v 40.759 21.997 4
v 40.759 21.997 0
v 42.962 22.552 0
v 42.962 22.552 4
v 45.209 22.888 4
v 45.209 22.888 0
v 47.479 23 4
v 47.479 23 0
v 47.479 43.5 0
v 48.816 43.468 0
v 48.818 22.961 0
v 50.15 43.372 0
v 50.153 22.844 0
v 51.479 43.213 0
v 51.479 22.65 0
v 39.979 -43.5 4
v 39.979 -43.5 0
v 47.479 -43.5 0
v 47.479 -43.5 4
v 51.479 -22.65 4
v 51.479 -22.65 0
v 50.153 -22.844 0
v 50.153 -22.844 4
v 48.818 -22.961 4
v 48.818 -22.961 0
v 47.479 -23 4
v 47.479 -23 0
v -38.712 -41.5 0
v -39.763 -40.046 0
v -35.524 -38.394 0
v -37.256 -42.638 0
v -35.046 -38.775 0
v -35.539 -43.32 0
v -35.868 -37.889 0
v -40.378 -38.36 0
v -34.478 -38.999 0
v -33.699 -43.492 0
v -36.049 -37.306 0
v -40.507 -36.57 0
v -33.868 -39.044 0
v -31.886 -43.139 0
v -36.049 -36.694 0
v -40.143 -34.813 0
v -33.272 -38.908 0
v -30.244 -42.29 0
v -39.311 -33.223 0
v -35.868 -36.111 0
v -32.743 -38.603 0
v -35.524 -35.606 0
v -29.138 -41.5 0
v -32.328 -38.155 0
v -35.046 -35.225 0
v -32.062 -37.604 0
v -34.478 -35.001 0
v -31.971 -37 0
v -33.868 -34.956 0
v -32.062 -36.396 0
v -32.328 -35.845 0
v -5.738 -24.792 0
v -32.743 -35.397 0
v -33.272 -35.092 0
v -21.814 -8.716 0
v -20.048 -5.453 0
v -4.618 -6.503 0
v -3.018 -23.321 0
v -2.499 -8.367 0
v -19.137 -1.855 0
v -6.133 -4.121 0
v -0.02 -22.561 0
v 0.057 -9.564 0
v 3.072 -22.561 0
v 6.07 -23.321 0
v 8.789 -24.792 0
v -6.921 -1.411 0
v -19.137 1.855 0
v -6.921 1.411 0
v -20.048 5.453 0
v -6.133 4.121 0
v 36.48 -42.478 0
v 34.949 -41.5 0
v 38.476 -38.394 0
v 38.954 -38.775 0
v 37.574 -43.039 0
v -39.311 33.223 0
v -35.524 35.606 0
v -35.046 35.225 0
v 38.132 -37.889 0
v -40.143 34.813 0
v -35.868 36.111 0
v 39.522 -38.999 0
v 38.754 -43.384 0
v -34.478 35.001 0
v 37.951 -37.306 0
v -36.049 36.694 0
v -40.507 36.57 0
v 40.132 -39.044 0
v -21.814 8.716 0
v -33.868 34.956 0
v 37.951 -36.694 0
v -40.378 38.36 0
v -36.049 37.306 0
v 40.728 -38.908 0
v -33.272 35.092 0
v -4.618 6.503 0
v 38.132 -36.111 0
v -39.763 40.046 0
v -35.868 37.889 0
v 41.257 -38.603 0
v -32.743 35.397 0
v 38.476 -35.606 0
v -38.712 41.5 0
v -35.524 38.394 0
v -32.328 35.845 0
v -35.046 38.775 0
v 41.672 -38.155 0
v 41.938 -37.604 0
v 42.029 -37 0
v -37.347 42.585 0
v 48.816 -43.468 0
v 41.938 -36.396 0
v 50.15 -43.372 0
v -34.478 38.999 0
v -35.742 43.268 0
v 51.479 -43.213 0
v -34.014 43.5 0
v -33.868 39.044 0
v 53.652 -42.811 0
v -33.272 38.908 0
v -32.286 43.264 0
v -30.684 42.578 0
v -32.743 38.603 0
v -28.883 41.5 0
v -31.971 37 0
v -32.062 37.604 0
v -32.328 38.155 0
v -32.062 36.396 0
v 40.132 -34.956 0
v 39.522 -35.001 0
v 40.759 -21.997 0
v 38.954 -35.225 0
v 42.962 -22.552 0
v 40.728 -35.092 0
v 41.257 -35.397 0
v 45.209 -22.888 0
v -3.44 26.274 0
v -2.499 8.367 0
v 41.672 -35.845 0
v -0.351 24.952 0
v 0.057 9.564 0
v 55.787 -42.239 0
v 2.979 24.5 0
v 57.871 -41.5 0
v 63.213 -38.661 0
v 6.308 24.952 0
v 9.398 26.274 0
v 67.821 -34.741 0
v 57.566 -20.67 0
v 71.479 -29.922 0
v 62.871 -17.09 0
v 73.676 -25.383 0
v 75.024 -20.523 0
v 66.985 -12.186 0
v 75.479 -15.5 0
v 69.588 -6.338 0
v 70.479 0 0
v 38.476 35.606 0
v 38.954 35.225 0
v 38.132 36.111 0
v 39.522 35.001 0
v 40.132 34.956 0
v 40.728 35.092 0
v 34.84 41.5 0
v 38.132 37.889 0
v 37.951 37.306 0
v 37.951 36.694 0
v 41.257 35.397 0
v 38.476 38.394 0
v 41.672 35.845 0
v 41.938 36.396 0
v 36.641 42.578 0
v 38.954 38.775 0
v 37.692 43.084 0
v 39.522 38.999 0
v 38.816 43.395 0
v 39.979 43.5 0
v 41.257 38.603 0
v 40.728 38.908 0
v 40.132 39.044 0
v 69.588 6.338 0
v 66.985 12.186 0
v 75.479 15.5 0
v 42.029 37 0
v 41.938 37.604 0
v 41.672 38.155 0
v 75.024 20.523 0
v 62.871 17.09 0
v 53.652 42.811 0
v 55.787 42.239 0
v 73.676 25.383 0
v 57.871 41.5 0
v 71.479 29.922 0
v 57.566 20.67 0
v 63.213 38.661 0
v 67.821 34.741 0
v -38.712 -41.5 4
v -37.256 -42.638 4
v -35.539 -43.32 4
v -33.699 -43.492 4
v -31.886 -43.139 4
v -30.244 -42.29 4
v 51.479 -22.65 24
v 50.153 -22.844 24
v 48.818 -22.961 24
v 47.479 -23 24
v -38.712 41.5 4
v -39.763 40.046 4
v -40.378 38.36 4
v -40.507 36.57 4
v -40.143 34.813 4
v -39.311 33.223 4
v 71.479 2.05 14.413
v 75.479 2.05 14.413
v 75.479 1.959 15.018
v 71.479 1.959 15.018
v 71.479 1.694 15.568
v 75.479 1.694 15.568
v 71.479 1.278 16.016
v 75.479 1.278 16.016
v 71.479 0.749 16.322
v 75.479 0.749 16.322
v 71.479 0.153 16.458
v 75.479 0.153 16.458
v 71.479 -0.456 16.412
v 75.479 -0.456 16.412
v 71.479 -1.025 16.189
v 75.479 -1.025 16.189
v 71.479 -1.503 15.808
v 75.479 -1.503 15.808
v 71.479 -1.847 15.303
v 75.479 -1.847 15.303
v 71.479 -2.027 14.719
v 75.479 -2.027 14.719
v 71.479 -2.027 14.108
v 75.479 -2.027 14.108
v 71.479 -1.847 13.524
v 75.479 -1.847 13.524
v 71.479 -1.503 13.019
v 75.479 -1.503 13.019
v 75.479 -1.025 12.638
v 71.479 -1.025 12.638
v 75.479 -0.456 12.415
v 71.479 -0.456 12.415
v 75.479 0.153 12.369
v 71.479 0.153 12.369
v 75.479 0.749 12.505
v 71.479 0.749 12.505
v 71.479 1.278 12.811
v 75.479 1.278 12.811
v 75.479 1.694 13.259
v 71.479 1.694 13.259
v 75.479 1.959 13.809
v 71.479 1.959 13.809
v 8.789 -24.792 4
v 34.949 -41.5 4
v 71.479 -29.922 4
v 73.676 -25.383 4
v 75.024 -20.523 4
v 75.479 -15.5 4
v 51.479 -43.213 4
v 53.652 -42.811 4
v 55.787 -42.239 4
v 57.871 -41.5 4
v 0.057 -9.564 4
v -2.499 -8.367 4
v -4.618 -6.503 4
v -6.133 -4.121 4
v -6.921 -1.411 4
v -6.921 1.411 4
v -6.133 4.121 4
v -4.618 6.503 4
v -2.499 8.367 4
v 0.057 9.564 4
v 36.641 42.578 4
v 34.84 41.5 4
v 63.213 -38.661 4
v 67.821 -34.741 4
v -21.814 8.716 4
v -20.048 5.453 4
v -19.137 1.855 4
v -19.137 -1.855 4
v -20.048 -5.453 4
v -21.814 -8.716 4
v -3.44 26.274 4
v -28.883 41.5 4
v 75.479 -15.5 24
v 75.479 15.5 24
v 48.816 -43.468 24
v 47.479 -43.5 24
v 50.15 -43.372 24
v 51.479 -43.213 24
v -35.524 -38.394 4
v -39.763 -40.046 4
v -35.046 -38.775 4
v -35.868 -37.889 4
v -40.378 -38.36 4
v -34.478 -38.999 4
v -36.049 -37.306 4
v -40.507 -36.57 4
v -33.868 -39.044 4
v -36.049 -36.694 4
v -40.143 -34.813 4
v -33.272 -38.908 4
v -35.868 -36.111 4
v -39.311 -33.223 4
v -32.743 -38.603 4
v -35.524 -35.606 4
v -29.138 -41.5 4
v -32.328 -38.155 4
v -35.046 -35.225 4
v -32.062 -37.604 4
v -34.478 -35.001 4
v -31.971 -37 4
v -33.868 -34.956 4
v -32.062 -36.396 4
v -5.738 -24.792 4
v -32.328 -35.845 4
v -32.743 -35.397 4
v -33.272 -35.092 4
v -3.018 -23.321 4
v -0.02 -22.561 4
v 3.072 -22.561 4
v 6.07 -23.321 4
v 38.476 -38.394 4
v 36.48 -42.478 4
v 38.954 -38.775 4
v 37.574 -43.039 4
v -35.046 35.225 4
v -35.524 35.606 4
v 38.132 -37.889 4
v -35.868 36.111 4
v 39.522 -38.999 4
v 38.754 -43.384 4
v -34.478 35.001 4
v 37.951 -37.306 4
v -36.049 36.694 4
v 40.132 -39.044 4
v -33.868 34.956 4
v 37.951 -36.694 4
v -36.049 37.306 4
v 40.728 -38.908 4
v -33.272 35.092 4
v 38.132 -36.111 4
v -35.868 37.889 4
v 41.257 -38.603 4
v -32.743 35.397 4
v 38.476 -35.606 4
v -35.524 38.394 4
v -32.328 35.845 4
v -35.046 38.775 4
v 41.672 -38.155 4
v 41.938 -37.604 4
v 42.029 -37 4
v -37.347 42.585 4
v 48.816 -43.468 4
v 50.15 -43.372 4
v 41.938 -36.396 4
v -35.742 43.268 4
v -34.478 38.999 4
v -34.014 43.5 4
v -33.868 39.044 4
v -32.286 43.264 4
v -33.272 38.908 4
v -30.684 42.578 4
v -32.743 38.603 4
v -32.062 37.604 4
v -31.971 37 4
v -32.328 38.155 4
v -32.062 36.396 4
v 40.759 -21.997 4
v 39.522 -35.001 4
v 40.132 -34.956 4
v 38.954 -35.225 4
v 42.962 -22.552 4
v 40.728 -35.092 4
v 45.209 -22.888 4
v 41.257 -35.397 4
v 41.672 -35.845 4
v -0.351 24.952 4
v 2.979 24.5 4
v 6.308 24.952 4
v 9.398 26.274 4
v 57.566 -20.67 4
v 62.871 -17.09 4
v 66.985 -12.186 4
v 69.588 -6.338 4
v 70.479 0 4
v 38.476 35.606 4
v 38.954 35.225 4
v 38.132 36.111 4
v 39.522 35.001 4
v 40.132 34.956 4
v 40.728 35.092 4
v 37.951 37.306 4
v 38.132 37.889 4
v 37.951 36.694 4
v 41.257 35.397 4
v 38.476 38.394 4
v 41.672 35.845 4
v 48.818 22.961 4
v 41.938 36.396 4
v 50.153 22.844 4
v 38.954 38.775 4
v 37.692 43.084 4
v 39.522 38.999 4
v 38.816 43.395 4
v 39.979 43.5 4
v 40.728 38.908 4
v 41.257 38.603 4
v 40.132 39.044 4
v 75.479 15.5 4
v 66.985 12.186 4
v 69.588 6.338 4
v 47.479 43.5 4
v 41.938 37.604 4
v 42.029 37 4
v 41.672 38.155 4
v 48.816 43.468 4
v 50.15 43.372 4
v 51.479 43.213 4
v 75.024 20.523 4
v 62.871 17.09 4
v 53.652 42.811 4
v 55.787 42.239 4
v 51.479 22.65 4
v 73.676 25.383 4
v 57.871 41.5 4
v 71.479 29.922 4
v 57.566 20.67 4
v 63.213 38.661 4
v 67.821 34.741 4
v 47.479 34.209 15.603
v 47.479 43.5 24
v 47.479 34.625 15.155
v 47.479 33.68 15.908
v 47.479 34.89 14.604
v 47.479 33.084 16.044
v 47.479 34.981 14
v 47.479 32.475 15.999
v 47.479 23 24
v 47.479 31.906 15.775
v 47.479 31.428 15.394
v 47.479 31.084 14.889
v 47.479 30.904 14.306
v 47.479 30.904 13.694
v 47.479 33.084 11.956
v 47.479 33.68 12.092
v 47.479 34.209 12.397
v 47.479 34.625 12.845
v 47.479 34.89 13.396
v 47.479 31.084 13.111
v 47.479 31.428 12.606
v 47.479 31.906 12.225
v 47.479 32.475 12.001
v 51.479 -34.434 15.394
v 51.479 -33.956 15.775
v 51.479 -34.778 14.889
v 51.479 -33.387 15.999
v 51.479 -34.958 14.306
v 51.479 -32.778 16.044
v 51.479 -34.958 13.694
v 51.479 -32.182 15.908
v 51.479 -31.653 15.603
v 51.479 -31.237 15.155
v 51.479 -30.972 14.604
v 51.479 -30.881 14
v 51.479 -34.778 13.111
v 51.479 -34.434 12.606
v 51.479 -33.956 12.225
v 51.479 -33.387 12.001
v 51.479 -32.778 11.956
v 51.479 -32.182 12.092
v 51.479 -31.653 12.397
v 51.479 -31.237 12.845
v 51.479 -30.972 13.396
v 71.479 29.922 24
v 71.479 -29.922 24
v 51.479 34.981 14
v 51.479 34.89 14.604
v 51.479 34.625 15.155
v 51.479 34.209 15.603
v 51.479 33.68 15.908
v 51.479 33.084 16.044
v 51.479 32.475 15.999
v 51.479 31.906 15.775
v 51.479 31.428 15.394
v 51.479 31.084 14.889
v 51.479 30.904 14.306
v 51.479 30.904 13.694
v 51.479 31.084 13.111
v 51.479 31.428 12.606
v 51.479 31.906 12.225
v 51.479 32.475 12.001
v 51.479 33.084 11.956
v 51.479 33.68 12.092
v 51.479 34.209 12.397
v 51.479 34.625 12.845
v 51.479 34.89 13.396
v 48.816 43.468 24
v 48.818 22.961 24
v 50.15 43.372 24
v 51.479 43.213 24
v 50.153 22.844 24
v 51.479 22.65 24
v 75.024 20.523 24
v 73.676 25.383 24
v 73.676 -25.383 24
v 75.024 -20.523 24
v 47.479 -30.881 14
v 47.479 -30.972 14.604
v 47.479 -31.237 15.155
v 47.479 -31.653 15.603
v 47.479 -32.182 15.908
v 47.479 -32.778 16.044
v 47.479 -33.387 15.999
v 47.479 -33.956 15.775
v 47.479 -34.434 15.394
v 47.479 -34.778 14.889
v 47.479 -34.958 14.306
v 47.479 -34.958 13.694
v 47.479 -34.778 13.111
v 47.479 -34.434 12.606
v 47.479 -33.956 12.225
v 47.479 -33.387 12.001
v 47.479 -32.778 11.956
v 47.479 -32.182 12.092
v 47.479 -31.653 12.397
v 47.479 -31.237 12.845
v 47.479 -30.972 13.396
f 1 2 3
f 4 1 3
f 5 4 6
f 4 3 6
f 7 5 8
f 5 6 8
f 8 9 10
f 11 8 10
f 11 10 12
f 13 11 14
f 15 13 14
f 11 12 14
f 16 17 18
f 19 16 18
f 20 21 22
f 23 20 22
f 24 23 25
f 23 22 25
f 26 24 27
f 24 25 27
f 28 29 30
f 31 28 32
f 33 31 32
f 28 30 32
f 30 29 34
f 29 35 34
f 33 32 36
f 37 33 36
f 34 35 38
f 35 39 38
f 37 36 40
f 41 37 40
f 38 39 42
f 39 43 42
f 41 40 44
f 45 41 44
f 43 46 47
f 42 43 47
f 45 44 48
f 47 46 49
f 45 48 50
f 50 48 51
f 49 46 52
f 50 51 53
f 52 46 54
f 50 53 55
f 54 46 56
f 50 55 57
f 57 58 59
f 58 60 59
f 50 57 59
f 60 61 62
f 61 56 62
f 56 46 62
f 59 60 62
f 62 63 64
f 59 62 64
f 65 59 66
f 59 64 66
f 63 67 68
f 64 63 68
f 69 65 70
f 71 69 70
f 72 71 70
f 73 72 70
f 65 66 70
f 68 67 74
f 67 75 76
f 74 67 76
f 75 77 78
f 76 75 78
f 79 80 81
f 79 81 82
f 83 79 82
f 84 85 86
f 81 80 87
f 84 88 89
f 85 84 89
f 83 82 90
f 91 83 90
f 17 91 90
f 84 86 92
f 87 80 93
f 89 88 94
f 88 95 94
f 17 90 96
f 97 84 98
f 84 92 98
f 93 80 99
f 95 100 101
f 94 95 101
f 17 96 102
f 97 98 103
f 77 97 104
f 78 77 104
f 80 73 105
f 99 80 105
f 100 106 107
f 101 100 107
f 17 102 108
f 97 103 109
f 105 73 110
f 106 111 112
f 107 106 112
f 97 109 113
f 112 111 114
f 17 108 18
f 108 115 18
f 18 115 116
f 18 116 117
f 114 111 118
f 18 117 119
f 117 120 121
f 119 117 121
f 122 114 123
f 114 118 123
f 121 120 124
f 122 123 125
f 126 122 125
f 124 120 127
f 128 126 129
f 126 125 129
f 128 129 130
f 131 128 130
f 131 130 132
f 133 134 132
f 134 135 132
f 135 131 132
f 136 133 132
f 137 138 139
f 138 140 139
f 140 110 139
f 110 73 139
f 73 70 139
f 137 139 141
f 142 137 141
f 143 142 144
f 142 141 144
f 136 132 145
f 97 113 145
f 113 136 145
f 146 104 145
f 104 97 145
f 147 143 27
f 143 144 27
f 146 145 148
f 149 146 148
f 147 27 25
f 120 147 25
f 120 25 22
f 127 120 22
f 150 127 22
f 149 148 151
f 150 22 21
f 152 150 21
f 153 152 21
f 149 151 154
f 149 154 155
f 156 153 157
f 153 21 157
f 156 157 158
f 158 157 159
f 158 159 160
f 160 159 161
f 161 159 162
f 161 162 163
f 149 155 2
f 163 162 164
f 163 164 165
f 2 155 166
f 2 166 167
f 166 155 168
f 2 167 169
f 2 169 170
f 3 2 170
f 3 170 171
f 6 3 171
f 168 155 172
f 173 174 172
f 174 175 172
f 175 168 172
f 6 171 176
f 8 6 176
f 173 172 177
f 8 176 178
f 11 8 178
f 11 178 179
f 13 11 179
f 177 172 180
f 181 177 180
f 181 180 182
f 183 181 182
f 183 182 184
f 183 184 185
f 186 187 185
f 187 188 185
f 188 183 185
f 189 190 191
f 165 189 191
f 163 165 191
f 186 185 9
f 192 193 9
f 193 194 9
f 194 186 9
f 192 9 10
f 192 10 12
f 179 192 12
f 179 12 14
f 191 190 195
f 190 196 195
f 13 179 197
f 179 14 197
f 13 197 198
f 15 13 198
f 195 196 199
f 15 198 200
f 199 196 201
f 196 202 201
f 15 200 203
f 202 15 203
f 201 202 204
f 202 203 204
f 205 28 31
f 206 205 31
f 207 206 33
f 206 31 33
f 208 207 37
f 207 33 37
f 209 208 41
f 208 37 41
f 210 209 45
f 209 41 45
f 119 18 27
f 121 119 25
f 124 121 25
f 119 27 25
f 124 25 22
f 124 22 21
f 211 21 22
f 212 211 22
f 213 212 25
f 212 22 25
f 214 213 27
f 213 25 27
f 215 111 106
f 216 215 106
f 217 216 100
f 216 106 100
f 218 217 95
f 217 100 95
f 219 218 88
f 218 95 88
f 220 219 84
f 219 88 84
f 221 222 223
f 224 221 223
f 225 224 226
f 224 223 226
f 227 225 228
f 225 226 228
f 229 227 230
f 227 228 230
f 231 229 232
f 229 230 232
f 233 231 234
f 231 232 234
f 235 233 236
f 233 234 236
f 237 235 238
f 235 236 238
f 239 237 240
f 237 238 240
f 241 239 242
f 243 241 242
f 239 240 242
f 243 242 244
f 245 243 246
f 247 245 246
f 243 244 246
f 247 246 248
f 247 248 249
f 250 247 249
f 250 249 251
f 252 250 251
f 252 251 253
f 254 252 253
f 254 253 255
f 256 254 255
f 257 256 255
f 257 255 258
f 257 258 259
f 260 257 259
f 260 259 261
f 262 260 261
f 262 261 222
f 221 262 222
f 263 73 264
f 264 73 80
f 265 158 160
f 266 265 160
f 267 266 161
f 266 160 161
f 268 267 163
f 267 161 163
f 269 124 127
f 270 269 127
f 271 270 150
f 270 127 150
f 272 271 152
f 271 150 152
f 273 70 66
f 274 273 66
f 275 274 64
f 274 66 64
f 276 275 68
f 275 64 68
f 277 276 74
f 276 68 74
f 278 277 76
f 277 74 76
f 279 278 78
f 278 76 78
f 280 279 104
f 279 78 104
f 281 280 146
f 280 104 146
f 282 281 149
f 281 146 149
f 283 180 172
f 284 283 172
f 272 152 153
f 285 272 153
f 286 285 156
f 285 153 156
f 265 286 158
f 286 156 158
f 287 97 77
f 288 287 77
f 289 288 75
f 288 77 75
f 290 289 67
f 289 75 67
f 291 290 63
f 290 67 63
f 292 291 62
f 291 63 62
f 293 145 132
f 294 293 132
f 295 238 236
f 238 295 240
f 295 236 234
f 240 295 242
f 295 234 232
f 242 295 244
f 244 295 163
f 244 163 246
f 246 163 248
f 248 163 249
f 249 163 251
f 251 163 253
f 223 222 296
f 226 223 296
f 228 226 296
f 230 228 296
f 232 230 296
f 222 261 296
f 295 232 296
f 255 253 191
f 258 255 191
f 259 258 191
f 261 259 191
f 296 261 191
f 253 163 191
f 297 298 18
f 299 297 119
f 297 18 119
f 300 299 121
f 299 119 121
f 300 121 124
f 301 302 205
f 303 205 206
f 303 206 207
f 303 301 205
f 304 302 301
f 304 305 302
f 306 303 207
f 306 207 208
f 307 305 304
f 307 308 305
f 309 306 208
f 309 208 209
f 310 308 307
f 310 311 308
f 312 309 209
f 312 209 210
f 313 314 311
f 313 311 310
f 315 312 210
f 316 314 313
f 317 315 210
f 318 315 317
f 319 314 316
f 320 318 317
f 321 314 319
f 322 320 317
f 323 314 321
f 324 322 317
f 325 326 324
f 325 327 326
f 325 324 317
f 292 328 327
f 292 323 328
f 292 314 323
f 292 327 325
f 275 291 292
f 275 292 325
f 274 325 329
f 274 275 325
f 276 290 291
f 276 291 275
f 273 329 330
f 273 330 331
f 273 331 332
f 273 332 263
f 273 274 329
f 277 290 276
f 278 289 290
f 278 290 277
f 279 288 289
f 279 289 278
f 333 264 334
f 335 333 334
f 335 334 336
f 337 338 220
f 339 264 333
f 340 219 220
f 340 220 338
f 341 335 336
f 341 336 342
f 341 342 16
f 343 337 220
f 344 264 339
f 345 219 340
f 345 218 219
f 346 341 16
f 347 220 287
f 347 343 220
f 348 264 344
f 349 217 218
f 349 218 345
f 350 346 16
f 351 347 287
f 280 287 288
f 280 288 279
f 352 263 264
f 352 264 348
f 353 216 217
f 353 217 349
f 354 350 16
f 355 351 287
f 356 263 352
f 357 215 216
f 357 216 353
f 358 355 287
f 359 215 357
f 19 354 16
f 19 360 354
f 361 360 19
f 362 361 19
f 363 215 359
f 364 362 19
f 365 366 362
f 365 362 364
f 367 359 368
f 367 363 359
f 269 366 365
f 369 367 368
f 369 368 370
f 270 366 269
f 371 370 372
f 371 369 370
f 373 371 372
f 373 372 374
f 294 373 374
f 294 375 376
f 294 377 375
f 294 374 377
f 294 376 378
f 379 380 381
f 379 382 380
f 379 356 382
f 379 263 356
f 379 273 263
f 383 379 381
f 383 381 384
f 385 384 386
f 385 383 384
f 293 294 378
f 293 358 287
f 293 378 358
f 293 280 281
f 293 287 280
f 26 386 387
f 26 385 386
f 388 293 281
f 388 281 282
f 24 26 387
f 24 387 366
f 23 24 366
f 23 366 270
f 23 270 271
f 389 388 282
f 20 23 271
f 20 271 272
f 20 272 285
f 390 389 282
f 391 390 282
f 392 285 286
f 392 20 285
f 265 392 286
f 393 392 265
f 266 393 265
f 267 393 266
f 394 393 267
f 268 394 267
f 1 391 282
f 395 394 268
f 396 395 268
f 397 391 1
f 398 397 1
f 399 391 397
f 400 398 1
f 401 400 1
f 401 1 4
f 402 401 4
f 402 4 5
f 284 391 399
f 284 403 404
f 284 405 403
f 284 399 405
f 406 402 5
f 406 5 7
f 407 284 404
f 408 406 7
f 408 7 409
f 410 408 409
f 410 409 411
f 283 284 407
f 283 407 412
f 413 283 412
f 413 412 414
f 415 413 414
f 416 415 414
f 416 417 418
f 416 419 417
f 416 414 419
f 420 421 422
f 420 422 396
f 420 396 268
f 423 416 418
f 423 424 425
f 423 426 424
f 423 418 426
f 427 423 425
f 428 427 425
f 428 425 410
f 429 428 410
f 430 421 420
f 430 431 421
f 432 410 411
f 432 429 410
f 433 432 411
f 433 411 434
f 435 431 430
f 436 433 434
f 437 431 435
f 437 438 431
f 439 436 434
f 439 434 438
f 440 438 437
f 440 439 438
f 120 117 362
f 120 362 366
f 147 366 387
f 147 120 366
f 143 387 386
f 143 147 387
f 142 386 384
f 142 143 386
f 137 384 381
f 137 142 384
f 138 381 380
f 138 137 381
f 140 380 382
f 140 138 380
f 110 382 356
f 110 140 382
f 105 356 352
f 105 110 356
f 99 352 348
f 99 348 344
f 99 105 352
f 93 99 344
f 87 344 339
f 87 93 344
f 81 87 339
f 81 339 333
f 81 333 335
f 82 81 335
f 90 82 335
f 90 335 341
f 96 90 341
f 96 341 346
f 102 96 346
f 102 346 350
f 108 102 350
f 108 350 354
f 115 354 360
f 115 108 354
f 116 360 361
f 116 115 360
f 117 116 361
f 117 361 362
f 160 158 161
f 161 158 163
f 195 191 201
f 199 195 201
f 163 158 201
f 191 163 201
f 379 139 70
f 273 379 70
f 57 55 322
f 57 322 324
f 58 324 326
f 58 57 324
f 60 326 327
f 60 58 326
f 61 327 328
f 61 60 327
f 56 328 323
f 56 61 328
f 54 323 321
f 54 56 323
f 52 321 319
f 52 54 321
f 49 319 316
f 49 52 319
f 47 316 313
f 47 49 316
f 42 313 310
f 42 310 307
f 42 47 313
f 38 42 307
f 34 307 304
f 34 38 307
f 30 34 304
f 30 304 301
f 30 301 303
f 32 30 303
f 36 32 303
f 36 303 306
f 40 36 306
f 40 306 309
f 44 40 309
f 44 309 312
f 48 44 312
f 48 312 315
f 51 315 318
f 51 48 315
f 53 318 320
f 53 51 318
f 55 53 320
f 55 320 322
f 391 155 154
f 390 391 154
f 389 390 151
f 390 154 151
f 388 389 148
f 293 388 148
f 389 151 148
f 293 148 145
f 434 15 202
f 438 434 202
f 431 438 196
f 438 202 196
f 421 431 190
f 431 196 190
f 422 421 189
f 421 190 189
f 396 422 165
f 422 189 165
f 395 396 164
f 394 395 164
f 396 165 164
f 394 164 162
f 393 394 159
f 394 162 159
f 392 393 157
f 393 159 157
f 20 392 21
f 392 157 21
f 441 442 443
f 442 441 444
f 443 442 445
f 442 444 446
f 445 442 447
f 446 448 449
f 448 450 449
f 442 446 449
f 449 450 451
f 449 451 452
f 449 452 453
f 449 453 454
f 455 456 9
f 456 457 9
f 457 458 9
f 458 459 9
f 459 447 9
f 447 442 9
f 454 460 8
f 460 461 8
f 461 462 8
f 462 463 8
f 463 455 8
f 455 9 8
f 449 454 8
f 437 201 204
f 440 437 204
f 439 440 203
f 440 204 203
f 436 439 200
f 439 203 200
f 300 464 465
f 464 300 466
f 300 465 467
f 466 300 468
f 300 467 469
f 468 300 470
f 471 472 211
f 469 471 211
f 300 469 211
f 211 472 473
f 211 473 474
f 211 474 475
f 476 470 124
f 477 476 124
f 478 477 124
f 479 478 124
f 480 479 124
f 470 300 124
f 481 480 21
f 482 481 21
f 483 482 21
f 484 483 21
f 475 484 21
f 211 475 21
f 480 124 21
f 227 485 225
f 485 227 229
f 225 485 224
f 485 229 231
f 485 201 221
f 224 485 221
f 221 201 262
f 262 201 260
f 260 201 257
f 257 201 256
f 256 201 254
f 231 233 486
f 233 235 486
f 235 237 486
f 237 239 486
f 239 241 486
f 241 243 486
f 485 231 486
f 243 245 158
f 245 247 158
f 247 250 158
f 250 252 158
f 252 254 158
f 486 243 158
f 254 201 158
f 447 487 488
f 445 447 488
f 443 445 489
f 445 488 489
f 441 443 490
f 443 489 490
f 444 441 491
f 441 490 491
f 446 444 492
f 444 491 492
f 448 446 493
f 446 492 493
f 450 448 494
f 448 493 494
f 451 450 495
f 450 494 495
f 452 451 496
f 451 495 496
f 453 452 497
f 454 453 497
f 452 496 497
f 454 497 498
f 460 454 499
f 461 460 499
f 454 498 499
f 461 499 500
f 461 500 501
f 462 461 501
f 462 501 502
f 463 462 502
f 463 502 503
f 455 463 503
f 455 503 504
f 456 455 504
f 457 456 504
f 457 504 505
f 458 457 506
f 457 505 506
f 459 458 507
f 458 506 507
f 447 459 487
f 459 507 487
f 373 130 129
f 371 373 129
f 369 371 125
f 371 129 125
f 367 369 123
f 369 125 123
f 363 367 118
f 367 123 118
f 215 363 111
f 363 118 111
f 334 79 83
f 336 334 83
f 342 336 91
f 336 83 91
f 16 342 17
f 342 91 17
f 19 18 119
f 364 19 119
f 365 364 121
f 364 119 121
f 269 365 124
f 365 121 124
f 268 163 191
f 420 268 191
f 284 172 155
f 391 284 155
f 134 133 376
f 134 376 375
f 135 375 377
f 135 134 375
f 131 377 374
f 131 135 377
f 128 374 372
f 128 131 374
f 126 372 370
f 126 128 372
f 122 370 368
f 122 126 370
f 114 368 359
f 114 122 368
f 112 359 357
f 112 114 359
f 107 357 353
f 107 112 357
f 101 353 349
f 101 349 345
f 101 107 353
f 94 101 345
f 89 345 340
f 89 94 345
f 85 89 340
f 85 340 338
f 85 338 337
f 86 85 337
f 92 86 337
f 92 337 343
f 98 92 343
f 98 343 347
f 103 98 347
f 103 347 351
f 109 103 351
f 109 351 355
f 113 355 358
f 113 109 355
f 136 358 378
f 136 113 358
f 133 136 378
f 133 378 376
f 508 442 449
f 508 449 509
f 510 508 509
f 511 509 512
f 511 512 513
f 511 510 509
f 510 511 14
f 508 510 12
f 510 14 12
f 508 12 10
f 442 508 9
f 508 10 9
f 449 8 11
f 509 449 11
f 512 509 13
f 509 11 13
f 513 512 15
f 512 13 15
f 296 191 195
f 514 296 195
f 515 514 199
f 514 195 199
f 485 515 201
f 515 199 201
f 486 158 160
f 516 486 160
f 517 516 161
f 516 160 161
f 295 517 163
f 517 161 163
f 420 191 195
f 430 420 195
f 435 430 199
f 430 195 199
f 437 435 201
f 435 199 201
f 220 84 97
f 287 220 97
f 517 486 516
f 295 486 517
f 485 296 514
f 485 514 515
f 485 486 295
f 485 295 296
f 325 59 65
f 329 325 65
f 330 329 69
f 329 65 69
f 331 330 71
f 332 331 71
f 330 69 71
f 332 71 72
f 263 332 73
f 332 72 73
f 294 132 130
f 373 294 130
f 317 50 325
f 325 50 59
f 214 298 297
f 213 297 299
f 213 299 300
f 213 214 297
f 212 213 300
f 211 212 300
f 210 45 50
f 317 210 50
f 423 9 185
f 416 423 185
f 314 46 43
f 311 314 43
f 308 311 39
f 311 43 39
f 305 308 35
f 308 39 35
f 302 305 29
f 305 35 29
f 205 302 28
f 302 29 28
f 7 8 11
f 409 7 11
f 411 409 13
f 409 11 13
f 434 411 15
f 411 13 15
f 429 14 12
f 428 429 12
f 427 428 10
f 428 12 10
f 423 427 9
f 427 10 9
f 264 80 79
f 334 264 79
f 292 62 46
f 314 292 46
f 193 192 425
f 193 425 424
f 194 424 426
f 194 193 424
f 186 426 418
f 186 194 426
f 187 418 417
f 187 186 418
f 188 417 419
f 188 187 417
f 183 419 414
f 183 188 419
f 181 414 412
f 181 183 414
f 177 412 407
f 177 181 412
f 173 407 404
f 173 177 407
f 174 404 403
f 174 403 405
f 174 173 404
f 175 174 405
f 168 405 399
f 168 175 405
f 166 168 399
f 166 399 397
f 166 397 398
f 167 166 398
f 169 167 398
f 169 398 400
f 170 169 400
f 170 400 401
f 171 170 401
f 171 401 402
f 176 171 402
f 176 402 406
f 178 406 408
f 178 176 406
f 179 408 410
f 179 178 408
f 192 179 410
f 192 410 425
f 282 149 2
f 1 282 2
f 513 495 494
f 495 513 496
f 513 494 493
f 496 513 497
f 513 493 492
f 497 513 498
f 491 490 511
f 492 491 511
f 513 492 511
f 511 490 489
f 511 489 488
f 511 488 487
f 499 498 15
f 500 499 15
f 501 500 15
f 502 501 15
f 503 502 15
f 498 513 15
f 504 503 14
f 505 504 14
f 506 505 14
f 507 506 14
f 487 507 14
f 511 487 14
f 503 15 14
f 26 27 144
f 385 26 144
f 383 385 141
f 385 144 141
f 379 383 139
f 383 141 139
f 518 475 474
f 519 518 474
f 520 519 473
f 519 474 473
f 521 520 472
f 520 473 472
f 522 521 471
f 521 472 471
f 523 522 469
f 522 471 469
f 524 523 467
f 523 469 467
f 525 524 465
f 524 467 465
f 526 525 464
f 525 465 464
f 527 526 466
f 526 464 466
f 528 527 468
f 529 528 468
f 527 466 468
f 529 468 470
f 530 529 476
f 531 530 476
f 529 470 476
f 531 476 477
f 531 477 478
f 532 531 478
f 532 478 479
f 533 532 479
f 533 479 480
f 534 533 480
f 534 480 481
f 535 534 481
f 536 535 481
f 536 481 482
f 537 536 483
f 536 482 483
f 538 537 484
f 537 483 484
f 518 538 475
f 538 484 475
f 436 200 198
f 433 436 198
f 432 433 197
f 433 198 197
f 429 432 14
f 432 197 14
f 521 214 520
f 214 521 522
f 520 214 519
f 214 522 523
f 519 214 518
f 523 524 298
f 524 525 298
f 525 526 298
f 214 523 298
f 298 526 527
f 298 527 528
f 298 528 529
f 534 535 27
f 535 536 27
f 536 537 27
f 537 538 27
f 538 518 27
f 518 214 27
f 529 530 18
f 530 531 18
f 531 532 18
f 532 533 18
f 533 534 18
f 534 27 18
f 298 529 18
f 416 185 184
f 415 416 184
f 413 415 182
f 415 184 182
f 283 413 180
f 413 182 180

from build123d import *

# Parameters (mm, degrees)
F0_R     = 2.05
F1_DEPTH = 4
F2_DEPTH = 24
F3_R     = 2.05
F4_DEPTH = 4
F5_R     = 2.05
F6_DEPTH = 8


with BuildPart() as f1:
    # F0 (on Top) → F1 (new body)
    with BuildSketch(Plane.XY):
        with BuildLine():
            Line((-28.883019991, 41.5), (-38.7118267615, 41.5))
            ThreePointArc((-38.7118267615, 41.5), (-40.5044236613, 37.4696241641), (-39.3114078672, 33.222972973))
            Line((-39.3114078672, 33.222972973), (-21.8137259274, 8.7162162162))
            ThreePointArc((-21.8137259274, 8.7162162162), (-19.0214110017, 0), (-21.8137259274, -8.7162162162))
            Line((-21.8137259274, -8.7162162162), (-39.3114078672, -33.222972973))
            ThreePointArc((-39.3114078672, -33.222972973), (-40.5044236613, -37.4696241641), (-38.7118267615, -41.5))
            Line((-38.7118267615, -41.5), (-29.1379367842, -41.5))
            Line((-29.1379367842, -41.5), (-5.7376272179, -24.7923149257))
            ThreePointArc((-5.7376272179, -24.7923149257), (1.5258862956, -22.465385821), (8.7893998091, -24.7923149257))
            Line((8.7893998091, -24.7923149257), (34.9485507955, -41.5))
            Line((34.9485507955, -41.5), (47.4785889983, -41.5))
            Line((47.4785889983, -41.5), (47.4785889983, -23))
            ThreePointArc((47.4785889983, -23), (44.0817896822, -22.7477857034), (40.7594878747, -21.9966742961))
            Line((40.7594878747, -21.9966742961), (19.4785892543, -15.4962139126))
            Line((19.4785892543, -15.4962139126), (0.0572406837, -9.5637714331))
            ThreePointArc((0.0572406837, -9.5637714331), (-7.0214110017, 0), (0.0572406837, 9.5637714331))
            Line((0.0572406837, 9.5637714331), (19.4785892543, 15.4962139126))
            Line((19.4785892543, 15.4962139126), (40.7594878747, 21.9966742961))
            ThreePointArc((40.7594878747, 21.9966742961), (44.0817896822, 22.7477857034), (47.4785889983, 23))
            Line((47.4785889983, 23), (47.4785889983, 41.5))
            Line((47.4785889983, 41.5), (34.8401979877, 41.5))
            Line((34.8401979877, 41.5), (9.3975079172, 26.2739811714))
            ThreePointArc((9.3975079172, 26.2739811714), (2.9785889983, 24.5), (-3.4403299206, 26.2739811714))
            Line((-3.4403299206, 26.2739811714), (-28.883019991, 41.5))
        make_face()
        with Locations((-34.0214110017, -37)):
            Circle(F0_R, mode=Mode.SUBTRACT)
        with Locations((39.9785889983, -37)):
            Circle(F0_R, mode=Mode.SUBTRACT)
        with Locations((-34.0214110017, 37)):
            Circle(F0_R, mode=Mode.SUBTRACT)
        with Locations((39.9785889983, 37)):
            Circle(F0_R, mode=Mode.SUBTRACT)
        with BuildLine():
            ThreePointArc((-30.6835731638, 42.5775297909), (-34.8860695304, 43.4422329691), (-38.7118267615, 41.5))
            Line((-38.7118267615, 41.5), (-28.883019991, 41.5))
            Line((-28.883019991, 41.5), (-30.6835731638, 42.5775297909))
        make_face()
        with BuildLine():
            Line((-29.1379367842, -41.5), (-38.7118267615, -41.5))
            ThreePointArc((-38.7118267615, -41.5), (-34.62522679, -43.4718935787), (-30.2443839747, -42.2899968655))
            Line((-30.2443839747, -42.2899968655), (-29.1379367842, -41.5))
        make_face()
        with BuildLine():
            Line((36.6407511605, 42.5775297909), (34.8401979877, 41.5))
            Line((34.8401979877, 41.5), (47.4785889983, 41.5))
            Line((47.4785889983, 41.5), (47.4785889983, 43.5))
            Line((47.4785889983, 43.5), (39.9785889983, 43.5))
            ThreePointArc((39.9785889983, 43.5), (38.2471074998, 43.2651394095), (36.6407511605, 42.5775297909))
        make_face()
        with BuildLine():
            Line((47.4785889983, 43.5), (47.4785889983, 41.5))
            Line((47.4785889983, 41.5), (51.4785889983, 41.5))
            Line((51.4785889983, 41.5), (51.4785889983, 43.2128129211))
            ThreePointArc((51.4785889983, 43.2128129211), (49.4837371486, 43.4281109439), (47.4785889983, 43.5))
        make_face()
        with BuildLine():
            Line((51.4785889983, 41.5), (47.4785889983, 41.5))
            Line((47.4785889983, 41.5), (47.4785889983, 23))
            ThreePointArc((47.4785889983, 23), (49.4862523125, 22.9122082746), (51.4785889983, 22.6495033058))
            Line((51.4785889983, 22.6495033058), (51.4785889983, 41.5))
        make_face()
        with BuildLine():
            Line((57.8708938437, 41.5), (51.4785889983, 41.5))
            Line((51.4785889983, 41.5), (51.4785889983, 22.6495033058))
            ThreePointArc((51.4785889983, 22.6495033058), (70.4785889983, 0), (51.4785889983, -22.6495033058))
            Line((51.4785889983, -22.6495033058), (51.4785889983, -41.5))
            Line((51.4785889983, -41.5), (57.8708938437, -41.5))
            ThreePointArc((57.8708938437, -41.5), (65.6229818463, -36.8255951424), (71.4785889983, -29.9222051019))
            Line((71.4785889983, -29.9222051019), (71.4785889983, 29.9222051019))
            ThreePointArc((71.4785889983, 29.9222051019), (65.6229818463, 36.8255951424), (57.8708938437, 41.5))
        make_face()
        with BuildLine():
            Line((51.4785889983, 43.2128129211), (51.4785889983, 41.5))
            Line((51.4785889983, 41.5), (57.8708938437, 41.5))
            ThreePointArc((57.8708938437, 41.5), (54.7255222612, 42.5459231361), (51.4785889983, 43.2128129211))
        make_face()
        with BuildLine():
            ThreePointArc((75.4785889983, 15.5), (74.4600641248, 22.9833147735), (71.4785889983, 29.9222051019))
            Line((71.4785889983, 29.9222051019), (71.4785889983, -29.9222051019))
            ThreePointArc((71.4785889983, -29.9222051019), (74.4600641248, -22.9833147735), (75.4785889983, -15.5))
            Line((75.4785889983, -15.5), (75.4785889983, 15.5))
        make_face()
        with BuildLine():
            Line((47.4785889983, -23), (47.4785889983, -41.5))
            Line((47.4785889983, -41.5), (51.4785889983, -41.5))
            Line((51.4785889983, -41.5), (51.4785889983, -22.6495033058))
            ThreePointArc((51.4785889983, -22.6495033058), (49.4862523125, -22.9122082746), (47.4785889983, -23))
        make_face()
        with BuildLine():
            Line((57.8708938437, -41.5), (51.4785889983, -41.5))
            Line((51.4785889983, -41.5), (51.4785889983, -43.2128129211))
            ThreePointArc((51.4785889983, -43.2128129211), (54.7255222612, -42.5459231361), (57.8708938437, -41.5))
        make_face()
        with BuildLine():
            Line((51.4785889983, -41.5), (47.4785889983, -41.5))
            Line((47.4785889983, -41.5), (47.4785889983, -43.5))
            ThreePointArc((47.4785889983, -43.5), (49.4837371486, -43.4281109439), (51.4785889983, -43.2128129211))
            Line((51.4785889983, -43.2128129211), (51.4785889983, -41.5))
        make_face()
        with BuildLine():
            Line((47.4785889983, -41.5), (34.9485507955, -41.5))
            Line((34.9485507955, -41.5), (36.4798180214, -42.4780107385))
            ThreePointArc((36.4798180214, -42.4780107385), (38.1561002878, -43.2392735875), (39.9785889983, -43.5))
            Line((39.9785889983, -43.5), (47.4785889983, -43.5))
            Line((47.4785889983, -43.5), (47.4785889983, -41.5))
        make_face()
    extrude(amount=F1_DEPTH)


with BuildPart() as f2:
    # F0 (on Top) → F2 (new body)
    with BuildSketch(Plane.XY):
        with BuildLine():
            Line((47.4785889983, 43.5), (47.4785889983, 41.5))
            Line((47.4785889983, 41.5), (51.4785889983, 41.5))
            Line((51.4785889983, 41.5), (51.4785889983, 43.2128129211))
            ThreePointArc((51.4785889983, 43.2128129211), (49.4837371486, 43.4281109439), (47.4785889983, 43.5))
        make_face()
        with BuildLine():
            Line((51.4785889983, 41.5), (47.4785889983, 41.5))
            Line((47.4785889983, 41.5), (47.4785889983, 23))
            ThreePointArc((47.4785889983, 23), (49.4862523125, 22.9122082746), (51.4785889983, 22.6495033058))
            Line((51.4785889983, 22.6495033058), (51.4785889983, 41.5))
        make_face()
    extrude(amount=F2_DEPTH)


with BuildPart() as f2b:
    # F0 (on Top) → F2, piece 2 (new body)
    with BuildSketch(Plane.XY):
        with BuildLine():
            ThreePointArc((75.4785889983, 15.5), (74.4600641248, 22.9833147735), (71.4785889983, 29.9222051019))
            Line((71.4785889983, 29.9222051019), (71.4785889983, -29.9222051019))
            ThreePointArc((71.4785889983, -29.9222051019), (74.4600641248, -22.9833147735), (75.4785889983, -15.5))
            Line((75.4785889983, -15.5), (75.4785889983, 15.5))
        make_face()
    extrude(amount=F2_DEPTH)

    # F5 (on face) → F6 (cut)
    with BuildSketch(Plane.YZ.offset(75.4785889983)):
        with Locations((0, 14.4133102149)):
            Circle(F5_R)
    extrude(amount=-F6_DEPTH, mode=Mode.SUBTRACT)


with BuildPart() as f2c:
    # F0 (on Top) → F2, piece 3 (new body)
    with BuildSketch(Plane.XY):
        with BuildLine():
            Line((47.4785889983, -23), (47.4785889983, -41.5))
            Line((47.4785889983, -41.5), (51.4785889983, -41.5))
            Line((51.4785889983, -41.5), (51.4785889983, -22.6495033058))
            ThreePointArc((51.4785889983, -22.6495033058), (49.4862523125, -22.9122082746), (47.4785889983, -23))
        make_face()
        with BuildLine():
            Line((51.4785889983, -41.5), (47.4785889983, -41.5))
            Line((47.4785889983, -41.5), (47.4785889983, -43.5))
            ThreePointArc((47.4785889983, -43.5), (49.4837371486, -43.4281109439), (51.4785889983, -43.2128129211))
            Line((51.4785889983, -43.2128129211), (51.4785889983, -41.5))
        make_face()
    extrude(amount=F2_DEPTH)


with BuildPart() as f4_tool:
    # F3 (on face) → F4 (new body, symmetric)
    with BuildSketch(Plane.YZ.offset(51.4785889983)):
        with Locations((-32.9311581135, 14)):
            Circle(F3_R)
        with Locations((32.9311581135, 14)):
            Circle(F3_R)
    extrude(amount=F4_DEPTH, both=True)


with BuildPart() as f2_1:
    add(f2.part)

    # F4: cut by f4_tool
    add(f4_tool.part, mode=Mode.SUBTRACT)


with BuildPart() as f2c_1:
    add(f2c.part)

    # F4: cut by f4_tool
    add(f4_tool.part, mode=Mode.SUBTRACT)


solid = Compound([f1.part, f2b.part, f2_1.part, f2c_1.part])
